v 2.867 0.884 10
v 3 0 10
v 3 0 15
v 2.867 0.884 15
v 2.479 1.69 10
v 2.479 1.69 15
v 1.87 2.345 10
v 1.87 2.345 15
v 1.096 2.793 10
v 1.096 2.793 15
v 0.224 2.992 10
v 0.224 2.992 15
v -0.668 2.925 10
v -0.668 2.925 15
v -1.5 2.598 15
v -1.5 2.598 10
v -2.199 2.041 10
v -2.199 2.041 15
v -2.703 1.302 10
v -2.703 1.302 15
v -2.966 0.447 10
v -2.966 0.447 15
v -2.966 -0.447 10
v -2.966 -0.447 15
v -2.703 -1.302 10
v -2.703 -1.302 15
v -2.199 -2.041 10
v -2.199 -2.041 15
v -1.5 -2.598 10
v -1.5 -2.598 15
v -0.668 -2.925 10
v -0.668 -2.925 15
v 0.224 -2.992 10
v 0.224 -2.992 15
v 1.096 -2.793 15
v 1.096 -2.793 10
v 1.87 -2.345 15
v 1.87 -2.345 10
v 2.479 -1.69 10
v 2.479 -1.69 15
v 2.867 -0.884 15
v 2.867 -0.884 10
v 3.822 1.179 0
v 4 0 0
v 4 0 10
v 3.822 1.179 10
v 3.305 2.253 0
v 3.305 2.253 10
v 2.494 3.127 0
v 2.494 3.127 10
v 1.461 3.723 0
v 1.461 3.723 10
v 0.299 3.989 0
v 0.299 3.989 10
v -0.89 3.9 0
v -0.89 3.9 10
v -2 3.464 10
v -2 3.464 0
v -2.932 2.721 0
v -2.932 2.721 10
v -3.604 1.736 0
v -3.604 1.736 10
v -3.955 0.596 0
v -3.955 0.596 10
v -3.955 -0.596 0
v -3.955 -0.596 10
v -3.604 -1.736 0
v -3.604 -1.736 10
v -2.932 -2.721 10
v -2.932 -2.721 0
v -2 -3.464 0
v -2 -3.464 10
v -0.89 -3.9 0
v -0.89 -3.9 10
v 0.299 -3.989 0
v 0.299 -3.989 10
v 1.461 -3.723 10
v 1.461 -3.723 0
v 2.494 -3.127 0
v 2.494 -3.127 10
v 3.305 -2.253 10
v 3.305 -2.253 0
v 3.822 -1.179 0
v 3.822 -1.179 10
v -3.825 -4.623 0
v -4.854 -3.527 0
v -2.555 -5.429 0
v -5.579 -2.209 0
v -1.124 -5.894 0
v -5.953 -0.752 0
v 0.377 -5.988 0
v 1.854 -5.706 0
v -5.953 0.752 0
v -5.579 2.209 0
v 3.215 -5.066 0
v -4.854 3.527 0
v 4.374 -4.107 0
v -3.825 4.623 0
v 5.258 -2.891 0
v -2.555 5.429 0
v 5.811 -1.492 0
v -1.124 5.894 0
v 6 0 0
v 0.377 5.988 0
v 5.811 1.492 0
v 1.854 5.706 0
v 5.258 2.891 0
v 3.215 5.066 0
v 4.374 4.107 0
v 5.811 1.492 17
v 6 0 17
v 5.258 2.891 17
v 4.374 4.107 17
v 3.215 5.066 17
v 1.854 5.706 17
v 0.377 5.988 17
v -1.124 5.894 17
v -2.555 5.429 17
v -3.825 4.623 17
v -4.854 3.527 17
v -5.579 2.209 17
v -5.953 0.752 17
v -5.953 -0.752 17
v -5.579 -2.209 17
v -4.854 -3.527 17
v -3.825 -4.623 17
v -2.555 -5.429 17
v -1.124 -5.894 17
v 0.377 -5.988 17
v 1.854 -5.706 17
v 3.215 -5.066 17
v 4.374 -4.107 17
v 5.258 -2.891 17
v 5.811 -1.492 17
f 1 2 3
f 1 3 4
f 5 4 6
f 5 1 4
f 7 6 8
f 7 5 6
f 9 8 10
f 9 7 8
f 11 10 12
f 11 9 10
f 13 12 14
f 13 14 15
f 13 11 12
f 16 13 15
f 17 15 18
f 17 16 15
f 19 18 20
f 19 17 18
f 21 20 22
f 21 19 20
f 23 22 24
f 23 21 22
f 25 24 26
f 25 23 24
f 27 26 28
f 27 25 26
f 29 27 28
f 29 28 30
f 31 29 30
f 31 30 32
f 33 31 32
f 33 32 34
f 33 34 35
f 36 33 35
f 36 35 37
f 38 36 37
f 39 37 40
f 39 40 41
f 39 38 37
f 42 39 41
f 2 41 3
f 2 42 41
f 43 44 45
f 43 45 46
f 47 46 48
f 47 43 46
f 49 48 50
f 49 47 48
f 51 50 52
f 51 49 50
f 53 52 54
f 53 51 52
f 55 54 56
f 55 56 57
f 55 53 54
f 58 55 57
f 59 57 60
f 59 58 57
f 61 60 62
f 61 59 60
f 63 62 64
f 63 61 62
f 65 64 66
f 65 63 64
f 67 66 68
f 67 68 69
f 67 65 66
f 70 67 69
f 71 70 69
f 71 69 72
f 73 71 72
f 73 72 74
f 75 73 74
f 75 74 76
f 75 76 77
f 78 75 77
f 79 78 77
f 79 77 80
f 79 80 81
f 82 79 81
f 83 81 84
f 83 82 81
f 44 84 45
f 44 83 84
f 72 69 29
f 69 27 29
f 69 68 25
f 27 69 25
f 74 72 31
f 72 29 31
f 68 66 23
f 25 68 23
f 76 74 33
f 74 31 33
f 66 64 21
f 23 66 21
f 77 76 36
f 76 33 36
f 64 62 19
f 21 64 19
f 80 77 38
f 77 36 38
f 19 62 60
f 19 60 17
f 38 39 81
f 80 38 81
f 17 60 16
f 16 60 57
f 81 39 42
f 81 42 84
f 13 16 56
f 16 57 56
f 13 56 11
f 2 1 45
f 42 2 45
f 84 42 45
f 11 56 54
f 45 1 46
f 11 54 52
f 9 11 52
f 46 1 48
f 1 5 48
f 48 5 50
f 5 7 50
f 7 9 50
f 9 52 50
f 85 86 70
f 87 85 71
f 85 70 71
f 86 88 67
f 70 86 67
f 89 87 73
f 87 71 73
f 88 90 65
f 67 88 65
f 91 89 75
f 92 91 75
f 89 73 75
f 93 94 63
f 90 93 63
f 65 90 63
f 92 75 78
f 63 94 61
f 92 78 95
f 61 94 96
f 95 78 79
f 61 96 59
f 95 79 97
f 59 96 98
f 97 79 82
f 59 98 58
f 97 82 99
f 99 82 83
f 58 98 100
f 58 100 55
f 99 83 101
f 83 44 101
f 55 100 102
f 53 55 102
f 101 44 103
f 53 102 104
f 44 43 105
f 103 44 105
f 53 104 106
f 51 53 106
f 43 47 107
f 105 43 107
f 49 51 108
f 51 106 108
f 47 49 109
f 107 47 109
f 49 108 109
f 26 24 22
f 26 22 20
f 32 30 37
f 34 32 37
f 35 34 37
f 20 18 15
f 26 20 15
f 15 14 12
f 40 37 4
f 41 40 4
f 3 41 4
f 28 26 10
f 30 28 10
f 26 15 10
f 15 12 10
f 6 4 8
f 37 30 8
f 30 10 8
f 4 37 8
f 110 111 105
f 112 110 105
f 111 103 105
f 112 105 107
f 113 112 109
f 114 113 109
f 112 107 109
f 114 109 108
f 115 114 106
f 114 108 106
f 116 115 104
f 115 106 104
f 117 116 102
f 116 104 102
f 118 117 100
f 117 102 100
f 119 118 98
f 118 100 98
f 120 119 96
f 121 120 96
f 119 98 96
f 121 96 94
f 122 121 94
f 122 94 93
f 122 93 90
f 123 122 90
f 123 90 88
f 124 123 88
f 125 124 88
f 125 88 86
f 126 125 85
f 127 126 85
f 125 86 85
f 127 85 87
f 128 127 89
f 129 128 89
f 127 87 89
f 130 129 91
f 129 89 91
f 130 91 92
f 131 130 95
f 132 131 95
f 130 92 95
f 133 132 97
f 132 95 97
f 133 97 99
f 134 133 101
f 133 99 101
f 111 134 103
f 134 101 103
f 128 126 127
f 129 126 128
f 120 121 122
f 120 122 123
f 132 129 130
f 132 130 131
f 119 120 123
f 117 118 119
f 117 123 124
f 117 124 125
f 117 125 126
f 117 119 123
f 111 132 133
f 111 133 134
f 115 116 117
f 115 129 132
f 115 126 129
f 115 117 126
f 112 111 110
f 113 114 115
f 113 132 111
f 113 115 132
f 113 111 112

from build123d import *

# Parameters (mm, degrees)
F0_R     = 6
F0_R_2   = 4
F1_DEPTH = 10
F2_R     = 6
F2_R_2   = 4
F2_R_3   = 3
F3_DEPTH = 5
F4_R     = 6
F4_R_2   = 3
F5_DEPTH = 2


with BuildPart() as f1:
    # F0 (on Top) → F1 (new body)
    with BuildSketch(Plane.XY):
        Circle(F0_R)
        Circle(F0_R_2, mode=Mode.SUBTRACT)
    extrude(amount=F1_DEPTH)

    # F2 (on face) → F3 (join)
    with BuildSketch(Plane.XY.offset(10)):
        Circle(F2_R)
        Circle(F2_R_2, mode=Mode.SUBTRACT)
        Circle(F2_R_2)
        Circle(F2_R_3, mode=Mode.SUBTRACT)
    extrude(amount=F3_DEPTH)

    # F4 (on face) → F5 (join)
    with BuildSketch(Plane.XY.offset(15)):
        Circle(F4_R)
        Circle(F4_R_2, mode=Mode.SUBTRACT)
        Circle(F4_R_2)
    extrude(amount=F5_DEPTH)


solid = f1.part
